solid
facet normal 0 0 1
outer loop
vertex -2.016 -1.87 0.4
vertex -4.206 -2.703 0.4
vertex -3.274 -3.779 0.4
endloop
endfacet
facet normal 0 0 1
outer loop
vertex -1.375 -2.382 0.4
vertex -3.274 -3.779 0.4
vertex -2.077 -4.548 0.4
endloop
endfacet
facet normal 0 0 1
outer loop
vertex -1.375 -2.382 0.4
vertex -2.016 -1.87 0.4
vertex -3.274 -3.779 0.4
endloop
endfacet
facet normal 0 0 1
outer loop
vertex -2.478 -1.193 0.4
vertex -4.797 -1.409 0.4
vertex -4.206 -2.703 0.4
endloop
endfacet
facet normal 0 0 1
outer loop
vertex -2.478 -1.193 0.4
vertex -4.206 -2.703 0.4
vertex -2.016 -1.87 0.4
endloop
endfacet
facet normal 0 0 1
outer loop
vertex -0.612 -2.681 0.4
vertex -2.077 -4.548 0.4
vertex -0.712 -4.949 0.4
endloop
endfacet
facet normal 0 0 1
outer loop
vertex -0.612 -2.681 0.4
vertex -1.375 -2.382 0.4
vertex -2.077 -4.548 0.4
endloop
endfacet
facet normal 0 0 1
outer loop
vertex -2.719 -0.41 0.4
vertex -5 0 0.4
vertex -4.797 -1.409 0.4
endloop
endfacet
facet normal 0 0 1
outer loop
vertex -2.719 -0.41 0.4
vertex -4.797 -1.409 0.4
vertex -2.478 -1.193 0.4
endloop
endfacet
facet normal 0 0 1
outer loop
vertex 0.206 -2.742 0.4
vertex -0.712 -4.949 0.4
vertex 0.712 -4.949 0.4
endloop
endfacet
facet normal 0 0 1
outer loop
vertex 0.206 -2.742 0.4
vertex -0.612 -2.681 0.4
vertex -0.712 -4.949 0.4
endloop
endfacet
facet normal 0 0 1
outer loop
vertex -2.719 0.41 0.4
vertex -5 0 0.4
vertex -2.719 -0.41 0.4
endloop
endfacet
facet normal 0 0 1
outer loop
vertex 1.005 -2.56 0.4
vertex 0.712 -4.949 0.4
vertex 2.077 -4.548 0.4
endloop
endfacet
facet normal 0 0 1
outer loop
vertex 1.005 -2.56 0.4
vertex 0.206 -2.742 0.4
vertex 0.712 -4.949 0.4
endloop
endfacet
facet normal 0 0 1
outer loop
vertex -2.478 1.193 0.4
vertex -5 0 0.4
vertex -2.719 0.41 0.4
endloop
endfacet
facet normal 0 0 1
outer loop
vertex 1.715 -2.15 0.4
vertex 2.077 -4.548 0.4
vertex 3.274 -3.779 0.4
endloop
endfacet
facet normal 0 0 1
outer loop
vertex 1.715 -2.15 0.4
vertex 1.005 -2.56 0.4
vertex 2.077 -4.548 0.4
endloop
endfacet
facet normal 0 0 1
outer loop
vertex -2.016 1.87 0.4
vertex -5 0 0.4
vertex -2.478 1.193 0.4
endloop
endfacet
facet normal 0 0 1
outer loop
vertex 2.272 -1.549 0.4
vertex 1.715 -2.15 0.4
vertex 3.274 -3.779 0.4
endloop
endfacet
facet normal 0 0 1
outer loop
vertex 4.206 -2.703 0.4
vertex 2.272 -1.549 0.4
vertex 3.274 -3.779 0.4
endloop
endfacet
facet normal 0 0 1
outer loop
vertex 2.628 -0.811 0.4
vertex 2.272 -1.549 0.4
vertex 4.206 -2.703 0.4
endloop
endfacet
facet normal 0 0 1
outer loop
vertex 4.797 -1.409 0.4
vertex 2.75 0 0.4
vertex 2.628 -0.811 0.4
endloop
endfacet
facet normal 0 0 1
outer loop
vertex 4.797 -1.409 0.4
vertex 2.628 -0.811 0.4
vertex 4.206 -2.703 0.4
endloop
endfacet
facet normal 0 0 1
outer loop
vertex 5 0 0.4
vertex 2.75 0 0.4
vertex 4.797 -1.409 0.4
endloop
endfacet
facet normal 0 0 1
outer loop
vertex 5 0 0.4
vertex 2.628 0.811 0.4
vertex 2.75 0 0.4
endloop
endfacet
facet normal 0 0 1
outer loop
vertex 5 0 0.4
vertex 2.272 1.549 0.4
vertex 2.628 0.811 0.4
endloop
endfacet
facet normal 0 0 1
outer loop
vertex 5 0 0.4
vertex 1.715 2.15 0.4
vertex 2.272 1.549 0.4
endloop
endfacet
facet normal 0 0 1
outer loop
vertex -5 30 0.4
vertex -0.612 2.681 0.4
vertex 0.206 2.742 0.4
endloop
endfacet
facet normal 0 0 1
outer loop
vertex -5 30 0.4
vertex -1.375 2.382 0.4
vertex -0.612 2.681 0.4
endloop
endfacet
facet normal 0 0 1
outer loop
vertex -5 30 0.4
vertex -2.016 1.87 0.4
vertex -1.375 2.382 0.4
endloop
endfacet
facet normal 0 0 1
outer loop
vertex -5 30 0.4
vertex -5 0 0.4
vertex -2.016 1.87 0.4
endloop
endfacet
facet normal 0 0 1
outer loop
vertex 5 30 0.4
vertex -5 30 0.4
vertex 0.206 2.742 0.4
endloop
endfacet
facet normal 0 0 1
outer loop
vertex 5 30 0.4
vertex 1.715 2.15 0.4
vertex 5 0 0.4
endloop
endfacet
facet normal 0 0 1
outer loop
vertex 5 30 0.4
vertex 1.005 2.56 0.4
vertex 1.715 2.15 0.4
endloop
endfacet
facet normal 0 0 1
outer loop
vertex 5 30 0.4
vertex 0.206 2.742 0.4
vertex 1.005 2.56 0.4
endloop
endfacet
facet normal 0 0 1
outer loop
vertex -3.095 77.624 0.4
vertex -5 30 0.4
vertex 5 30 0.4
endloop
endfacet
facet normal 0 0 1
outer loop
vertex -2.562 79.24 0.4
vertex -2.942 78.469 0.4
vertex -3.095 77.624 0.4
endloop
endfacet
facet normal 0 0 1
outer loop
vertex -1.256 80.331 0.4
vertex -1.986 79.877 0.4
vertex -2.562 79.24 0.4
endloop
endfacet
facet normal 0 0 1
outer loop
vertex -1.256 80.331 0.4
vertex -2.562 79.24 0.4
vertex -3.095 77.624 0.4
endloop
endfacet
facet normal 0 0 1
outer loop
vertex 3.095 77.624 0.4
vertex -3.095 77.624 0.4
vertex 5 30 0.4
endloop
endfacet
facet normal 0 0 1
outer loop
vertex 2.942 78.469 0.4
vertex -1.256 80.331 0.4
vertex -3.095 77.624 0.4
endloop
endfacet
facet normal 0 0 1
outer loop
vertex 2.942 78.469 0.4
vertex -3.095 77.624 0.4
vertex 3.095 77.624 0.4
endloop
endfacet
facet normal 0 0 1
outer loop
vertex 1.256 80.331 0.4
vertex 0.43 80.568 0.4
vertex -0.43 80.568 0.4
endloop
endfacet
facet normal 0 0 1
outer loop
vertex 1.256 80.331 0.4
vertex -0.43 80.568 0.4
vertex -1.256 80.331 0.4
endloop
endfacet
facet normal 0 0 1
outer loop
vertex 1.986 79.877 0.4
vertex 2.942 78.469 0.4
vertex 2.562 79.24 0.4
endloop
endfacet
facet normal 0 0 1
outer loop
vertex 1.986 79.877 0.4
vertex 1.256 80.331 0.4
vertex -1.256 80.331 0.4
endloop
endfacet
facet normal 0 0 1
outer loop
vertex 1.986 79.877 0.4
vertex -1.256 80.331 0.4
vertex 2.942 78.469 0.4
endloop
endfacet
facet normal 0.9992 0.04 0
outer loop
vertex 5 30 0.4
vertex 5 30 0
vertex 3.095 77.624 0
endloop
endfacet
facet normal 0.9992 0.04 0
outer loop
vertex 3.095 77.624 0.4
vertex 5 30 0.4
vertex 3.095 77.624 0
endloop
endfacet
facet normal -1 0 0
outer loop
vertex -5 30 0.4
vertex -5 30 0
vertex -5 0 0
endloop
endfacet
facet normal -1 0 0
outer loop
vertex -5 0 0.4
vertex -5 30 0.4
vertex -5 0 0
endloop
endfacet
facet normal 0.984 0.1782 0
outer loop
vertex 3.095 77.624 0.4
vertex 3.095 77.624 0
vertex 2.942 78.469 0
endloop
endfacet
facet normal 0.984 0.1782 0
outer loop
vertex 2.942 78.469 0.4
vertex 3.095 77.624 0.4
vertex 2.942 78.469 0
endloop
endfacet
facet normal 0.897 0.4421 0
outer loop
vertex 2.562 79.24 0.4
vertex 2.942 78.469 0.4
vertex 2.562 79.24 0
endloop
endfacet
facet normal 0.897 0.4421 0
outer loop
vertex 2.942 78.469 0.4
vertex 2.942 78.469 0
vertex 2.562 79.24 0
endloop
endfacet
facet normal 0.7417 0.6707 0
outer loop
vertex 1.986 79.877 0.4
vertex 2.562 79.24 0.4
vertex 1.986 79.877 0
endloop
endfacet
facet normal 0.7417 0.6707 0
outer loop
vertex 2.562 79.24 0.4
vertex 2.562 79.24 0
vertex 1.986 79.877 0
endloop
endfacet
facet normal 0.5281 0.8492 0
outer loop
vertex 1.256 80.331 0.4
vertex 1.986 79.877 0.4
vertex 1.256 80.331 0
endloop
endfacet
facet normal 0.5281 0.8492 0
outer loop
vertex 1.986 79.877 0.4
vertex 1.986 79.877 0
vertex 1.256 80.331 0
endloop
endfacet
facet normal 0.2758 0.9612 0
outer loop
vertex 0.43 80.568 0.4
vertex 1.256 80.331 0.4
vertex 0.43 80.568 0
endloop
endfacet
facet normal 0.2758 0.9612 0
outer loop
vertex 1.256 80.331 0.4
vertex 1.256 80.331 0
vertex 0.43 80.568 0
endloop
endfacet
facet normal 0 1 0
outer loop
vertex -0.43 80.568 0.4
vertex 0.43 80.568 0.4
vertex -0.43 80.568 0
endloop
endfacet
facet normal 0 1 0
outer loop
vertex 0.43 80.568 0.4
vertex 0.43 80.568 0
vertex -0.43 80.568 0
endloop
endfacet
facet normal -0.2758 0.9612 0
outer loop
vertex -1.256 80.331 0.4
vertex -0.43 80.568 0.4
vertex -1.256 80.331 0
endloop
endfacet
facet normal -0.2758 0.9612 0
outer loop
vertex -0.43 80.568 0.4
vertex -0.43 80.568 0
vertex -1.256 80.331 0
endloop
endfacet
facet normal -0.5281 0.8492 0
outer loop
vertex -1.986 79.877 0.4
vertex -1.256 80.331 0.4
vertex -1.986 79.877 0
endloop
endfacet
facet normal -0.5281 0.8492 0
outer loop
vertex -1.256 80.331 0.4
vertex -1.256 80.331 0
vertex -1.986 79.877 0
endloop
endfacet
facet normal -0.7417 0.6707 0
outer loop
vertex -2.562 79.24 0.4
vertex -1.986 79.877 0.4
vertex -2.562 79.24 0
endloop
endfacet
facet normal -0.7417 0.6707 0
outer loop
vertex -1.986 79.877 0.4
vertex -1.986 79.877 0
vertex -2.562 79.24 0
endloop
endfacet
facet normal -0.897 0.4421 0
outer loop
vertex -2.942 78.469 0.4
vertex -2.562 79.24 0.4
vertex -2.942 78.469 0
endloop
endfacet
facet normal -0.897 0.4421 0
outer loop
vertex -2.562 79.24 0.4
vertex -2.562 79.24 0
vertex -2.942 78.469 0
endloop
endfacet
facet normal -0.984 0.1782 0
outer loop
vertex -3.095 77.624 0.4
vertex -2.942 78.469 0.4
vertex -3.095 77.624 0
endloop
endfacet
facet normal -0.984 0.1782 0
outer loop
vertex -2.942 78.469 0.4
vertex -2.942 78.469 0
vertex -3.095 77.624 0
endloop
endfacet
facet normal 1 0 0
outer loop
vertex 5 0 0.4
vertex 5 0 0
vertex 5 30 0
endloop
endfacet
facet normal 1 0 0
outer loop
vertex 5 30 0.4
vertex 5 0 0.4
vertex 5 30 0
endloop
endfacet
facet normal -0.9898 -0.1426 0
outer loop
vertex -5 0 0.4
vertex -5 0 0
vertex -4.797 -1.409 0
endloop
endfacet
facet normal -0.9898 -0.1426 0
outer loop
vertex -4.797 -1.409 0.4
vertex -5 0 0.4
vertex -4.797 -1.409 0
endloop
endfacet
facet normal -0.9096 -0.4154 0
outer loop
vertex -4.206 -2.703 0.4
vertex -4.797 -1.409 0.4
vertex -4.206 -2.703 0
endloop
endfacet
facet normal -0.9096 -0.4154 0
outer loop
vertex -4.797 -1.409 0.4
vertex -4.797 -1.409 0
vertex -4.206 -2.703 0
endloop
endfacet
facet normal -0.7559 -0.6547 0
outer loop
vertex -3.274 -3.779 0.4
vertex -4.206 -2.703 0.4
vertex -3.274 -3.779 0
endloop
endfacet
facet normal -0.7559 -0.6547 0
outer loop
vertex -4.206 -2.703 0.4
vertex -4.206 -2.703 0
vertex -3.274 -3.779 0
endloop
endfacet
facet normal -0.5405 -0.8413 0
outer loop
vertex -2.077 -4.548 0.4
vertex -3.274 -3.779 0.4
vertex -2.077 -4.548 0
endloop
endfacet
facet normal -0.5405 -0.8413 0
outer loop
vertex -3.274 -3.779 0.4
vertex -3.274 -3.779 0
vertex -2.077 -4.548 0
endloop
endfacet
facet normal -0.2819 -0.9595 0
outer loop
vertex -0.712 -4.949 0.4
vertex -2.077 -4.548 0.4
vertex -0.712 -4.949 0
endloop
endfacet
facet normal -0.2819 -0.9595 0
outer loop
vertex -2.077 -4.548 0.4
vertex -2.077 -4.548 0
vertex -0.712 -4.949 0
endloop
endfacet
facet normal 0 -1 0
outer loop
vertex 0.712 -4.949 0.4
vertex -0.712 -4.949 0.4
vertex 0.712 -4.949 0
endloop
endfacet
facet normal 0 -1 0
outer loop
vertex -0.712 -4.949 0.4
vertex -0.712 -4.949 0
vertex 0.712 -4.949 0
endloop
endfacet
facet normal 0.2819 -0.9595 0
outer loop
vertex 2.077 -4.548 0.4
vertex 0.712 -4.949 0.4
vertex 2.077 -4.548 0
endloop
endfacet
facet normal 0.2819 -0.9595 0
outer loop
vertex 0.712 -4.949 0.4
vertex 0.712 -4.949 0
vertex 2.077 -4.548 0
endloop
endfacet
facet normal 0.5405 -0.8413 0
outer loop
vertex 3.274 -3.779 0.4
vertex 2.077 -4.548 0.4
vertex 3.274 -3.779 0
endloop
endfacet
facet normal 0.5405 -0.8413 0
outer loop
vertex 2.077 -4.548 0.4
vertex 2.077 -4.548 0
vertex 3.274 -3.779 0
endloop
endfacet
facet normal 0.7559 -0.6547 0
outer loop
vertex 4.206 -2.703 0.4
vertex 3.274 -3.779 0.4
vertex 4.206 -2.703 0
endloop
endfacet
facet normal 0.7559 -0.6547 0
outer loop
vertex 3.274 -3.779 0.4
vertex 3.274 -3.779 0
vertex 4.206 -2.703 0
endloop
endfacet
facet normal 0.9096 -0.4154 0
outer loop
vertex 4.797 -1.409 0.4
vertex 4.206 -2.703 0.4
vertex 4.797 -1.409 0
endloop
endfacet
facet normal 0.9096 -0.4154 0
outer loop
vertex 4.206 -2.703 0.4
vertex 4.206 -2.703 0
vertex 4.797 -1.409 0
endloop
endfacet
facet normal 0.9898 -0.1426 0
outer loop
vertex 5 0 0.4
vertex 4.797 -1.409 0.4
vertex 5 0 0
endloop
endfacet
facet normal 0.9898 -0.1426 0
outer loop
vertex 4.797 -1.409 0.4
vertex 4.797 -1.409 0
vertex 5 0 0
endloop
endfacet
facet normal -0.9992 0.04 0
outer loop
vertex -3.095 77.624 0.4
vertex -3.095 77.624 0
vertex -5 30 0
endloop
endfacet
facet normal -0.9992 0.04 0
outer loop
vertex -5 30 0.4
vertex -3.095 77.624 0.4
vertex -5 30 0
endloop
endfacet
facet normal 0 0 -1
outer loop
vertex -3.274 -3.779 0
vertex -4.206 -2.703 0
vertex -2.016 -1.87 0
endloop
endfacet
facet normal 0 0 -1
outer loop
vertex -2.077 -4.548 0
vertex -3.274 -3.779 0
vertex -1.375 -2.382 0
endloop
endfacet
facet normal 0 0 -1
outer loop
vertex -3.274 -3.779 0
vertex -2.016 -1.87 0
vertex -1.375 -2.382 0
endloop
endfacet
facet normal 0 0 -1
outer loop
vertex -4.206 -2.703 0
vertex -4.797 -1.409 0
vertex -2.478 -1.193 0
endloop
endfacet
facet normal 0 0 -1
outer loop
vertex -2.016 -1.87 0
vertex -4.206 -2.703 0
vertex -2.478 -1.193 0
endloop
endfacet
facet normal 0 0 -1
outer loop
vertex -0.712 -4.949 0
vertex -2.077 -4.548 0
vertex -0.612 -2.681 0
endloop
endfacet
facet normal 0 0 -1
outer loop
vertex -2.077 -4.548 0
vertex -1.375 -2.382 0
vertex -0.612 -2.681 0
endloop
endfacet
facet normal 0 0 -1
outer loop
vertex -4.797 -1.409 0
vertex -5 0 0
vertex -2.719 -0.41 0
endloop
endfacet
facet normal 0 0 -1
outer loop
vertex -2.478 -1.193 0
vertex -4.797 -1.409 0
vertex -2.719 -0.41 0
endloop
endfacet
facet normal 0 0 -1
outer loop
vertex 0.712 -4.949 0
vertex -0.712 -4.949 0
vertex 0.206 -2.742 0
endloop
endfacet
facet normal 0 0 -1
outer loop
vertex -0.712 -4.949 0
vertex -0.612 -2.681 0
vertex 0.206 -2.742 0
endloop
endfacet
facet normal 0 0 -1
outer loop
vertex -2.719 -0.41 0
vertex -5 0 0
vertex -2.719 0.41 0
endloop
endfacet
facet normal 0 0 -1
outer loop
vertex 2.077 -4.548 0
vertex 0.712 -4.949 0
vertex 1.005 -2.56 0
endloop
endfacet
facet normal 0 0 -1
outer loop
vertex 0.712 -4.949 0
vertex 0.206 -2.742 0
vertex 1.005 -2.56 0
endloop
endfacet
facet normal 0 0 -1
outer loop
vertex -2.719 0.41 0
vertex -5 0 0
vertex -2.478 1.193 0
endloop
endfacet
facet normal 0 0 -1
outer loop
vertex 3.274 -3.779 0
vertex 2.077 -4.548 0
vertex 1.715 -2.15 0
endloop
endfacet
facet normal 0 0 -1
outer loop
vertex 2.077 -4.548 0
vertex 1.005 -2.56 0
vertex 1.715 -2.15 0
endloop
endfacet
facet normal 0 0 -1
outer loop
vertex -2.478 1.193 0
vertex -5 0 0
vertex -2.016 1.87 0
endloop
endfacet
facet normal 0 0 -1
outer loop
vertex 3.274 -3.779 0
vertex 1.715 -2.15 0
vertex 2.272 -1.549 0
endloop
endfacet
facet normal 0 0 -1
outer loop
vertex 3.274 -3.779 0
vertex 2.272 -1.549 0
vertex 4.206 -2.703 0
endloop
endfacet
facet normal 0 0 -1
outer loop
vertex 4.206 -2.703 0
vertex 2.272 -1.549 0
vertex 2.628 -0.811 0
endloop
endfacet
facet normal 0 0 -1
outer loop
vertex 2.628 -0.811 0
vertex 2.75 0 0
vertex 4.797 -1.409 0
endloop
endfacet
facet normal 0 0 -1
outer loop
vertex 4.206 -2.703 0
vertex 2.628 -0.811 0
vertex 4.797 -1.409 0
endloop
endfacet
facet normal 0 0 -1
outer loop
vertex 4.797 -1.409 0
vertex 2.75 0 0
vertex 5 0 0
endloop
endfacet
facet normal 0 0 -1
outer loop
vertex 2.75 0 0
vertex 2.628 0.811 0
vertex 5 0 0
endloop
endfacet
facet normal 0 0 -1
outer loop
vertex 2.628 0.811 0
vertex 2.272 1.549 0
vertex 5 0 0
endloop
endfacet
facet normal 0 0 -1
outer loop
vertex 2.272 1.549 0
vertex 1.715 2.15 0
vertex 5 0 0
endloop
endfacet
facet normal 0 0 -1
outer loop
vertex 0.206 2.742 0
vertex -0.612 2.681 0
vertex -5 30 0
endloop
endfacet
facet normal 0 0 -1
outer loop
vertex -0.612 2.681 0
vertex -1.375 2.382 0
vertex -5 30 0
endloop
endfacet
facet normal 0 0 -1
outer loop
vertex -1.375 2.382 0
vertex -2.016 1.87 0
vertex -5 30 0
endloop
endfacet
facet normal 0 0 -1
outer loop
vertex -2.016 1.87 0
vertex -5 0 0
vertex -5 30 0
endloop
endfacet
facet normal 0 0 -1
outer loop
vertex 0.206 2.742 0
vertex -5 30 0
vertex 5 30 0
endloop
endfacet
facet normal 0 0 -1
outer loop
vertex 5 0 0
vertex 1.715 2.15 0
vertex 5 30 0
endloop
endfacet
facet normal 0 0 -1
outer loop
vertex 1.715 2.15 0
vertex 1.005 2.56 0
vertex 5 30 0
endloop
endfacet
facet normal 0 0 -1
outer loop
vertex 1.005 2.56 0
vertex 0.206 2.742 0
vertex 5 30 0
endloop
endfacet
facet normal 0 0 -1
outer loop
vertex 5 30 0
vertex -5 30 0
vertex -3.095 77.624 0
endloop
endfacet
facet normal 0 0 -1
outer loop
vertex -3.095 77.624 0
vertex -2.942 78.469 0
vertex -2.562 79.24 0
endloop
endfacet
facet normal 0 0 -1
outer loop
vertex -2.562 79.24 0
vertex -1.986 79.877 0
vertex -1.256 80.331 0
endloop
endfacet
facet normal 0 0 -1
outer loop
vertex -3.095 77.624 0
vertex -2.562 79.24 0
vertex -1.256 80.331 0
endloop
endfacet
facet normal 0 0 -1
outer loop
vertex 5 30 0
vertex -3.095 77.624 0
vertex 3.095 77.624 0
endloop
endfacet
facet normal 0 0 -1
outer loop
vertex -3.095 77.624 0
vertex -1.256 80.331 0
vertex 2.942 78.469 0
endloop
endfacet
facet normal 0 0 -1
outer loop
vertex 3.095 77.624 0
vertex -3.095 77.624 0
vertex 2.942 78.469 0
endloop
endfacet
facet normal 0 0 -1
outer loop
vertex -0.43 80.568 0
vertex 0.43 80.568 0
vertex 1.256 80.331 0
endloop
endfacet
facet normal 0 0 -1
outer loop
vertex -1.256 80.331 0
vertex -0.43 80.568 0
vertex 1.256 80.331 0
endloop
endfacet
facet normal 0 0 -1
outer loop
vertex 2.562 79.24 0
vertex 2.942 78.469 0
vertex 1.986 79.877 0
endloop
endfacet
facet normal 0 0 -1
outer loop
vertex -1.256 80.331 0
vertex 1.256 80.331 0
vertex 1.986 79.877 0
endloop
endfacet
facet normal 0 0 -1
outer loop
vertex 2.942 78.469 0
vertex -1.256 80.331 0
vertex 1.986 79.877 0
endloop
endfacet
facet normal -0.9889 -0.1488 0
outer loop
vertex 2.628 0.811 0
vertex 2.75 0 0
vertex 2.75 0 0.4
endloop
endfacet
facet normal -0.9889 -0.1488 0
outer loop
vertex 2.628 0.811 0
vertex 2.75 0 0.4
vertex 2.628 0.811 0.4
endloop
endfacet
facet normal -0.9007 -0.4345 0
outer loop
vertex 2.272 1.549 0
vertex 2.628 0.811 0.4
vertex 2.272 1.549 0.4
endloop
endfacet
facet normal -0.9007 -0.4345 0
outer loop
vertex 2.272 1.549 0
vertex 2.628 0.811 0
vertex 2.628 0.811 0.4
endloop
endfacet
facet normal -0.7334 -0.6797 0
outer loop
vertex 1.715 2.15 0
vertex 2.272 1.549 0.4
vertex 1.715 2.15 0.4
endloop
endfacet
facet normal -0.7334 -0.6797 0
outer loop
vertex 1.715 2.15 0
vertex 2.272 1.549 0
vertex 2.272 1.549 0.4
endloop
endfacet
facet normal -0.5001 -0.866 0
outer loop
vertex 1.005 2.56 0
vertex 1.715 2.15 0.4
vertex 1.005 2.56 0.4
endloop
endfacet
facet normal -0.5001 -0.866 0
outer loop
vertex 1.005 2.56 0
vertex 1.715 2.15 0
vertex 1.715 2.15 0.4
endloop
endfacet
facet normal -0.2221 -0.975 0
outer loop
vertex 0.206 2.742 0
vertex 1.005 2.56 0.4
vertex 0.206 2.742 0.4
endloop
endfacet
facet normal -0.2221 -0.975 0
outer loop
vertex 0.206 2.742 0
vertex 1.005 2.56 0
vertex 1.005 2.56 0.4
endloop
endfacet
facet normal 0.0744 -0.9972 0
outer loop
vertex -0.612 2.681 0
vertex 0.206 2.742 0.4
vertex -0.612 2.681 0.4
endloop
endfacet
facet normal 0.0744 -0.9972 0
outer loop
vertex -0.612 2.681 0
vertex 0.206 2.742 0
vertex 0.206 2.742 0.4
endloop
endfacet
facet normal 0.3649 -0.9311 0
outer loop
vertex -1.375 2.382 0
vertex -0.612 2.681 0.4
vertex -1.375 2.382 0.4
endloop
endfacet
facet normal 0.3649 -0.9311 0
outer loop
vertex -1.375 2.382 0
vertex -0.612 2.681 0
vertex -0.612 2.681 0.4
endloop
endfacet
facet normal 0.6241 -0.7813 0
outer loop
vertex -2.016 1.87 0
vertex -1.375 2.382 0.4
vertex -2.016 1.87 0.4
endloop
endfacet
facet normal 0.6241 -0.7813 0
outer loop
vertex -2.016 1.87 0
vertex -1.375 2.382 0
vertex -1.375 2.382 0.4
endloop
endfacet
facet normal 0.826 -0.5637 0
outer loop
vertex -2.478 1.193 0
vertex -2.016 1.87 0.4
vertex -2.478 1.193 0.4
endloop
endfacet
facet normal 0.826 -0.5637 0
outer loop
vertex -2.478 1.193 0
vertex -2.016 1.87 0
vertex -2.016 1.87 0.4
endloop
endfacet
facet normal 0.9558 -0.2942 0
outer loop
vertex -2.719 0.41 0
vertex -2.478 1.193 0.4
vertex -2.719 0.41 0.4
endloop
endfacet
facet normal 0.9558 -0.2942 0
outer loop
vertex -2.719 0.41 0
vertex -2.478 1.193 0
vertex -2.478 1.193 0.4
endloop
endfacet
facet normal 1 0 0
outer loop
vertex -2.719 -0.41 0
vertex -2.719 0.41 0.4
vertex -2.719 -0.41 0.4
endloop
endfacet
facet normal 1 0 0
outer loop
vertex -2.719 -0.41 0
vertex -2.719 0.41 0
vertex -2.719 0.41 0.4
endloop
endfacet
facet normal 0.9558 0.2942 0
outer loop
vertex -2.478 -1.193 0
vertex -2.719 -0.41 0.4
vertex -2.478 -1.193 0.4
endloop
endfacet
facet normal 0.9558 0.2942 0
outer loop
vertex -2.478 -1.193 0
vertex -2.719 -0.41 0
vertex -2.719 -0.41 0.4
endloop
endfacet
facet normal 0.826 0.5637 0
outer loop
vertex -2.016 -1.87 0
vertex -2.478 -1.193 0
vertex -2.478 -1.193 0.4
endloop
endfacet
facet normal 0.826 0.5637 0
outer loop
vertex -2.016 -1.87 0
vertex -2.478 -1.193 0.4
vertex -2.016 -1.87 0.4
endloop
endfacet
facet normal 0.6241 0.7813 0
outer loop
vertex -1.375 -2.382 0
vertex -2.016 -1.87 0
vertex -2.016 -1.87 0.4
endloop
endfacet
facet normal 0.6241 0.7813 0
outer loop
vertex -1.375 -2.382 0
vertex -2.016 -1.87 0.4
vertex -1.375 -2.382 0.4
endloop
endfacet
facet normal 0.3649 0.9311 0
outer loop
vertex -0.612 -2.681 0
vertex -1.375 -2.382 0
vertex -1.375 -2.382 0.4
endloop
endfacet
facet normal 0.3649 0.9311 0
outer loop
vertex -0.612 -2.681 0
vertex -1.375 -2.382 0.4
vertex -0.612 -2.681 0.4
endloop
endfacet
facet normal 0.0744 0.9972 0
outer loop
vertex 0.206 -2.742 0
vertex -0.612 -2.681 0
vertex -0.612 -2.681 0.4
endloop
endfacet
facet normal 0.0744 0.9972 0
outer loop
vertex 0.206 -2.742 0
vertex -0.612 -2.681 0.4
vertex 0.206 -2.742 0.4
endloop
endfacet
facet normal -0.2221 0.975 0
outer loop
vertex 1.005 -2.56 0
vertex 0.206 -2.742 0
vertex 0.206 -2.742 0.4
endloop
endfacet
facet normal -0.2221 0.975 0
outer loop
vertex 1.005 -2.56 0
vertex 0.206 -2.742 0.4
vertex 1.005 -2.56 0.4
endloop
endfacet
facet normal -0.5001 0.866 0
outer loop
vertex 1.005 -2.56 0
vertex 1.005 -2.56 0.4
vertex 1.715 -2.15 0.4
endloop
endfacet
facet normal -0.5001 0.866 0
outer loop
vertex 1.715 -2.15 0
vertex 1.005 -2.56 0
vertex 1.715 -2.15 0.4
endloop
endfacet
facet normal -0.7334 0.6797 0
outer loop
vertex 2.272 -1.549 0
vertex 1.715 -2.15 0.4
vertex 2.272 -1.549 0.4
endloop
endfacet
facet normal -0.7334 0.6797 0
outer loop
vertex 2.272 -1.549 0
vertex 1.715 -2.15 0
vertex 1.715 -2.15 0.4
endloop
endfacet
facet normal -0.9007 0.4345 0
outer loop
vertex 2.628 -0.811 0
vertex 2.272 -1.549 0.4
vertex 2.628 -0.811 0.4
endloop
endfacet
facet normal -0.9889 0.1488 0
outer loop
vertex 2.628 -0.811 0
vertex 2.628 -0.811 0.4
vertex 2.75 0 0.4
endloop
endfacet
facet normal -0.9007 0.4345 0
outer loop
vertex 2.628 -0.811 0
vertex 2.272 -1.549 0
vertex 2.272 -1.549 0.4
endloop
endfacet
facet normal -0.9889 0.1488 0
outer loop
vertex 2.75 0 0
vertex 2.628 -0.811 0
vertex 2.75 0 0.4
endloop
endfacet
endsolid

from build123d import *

# Parameters (mm, degrees)
F0_R     = 2.75
F1_DEPTH = 0.4


with BuildPart() as f1:
    # F0 (on Top) → F1 (new body)
    with BuildSketch(Plane.XY):
        with BuildLine():
            Line((-5, 30), (-5, 0))
            ThreePointArc((-5, 0), (0, -5), (5, 0))
            Line((5, 0), (5, 30))
            Line((5, 30), (3.095048, 77.623802))
            ThreePointArc((3.095048, 77.623802), (0, 80.597523), (-3.095048, 77.623802))
            Line((-3.095048, 77.623802), (-5, 30))
        make_face()
        Circle(F0_R, mode=Mode.SUBTRACT)
    extrude(amount=F1_DEPTH)


solid = f1.part
